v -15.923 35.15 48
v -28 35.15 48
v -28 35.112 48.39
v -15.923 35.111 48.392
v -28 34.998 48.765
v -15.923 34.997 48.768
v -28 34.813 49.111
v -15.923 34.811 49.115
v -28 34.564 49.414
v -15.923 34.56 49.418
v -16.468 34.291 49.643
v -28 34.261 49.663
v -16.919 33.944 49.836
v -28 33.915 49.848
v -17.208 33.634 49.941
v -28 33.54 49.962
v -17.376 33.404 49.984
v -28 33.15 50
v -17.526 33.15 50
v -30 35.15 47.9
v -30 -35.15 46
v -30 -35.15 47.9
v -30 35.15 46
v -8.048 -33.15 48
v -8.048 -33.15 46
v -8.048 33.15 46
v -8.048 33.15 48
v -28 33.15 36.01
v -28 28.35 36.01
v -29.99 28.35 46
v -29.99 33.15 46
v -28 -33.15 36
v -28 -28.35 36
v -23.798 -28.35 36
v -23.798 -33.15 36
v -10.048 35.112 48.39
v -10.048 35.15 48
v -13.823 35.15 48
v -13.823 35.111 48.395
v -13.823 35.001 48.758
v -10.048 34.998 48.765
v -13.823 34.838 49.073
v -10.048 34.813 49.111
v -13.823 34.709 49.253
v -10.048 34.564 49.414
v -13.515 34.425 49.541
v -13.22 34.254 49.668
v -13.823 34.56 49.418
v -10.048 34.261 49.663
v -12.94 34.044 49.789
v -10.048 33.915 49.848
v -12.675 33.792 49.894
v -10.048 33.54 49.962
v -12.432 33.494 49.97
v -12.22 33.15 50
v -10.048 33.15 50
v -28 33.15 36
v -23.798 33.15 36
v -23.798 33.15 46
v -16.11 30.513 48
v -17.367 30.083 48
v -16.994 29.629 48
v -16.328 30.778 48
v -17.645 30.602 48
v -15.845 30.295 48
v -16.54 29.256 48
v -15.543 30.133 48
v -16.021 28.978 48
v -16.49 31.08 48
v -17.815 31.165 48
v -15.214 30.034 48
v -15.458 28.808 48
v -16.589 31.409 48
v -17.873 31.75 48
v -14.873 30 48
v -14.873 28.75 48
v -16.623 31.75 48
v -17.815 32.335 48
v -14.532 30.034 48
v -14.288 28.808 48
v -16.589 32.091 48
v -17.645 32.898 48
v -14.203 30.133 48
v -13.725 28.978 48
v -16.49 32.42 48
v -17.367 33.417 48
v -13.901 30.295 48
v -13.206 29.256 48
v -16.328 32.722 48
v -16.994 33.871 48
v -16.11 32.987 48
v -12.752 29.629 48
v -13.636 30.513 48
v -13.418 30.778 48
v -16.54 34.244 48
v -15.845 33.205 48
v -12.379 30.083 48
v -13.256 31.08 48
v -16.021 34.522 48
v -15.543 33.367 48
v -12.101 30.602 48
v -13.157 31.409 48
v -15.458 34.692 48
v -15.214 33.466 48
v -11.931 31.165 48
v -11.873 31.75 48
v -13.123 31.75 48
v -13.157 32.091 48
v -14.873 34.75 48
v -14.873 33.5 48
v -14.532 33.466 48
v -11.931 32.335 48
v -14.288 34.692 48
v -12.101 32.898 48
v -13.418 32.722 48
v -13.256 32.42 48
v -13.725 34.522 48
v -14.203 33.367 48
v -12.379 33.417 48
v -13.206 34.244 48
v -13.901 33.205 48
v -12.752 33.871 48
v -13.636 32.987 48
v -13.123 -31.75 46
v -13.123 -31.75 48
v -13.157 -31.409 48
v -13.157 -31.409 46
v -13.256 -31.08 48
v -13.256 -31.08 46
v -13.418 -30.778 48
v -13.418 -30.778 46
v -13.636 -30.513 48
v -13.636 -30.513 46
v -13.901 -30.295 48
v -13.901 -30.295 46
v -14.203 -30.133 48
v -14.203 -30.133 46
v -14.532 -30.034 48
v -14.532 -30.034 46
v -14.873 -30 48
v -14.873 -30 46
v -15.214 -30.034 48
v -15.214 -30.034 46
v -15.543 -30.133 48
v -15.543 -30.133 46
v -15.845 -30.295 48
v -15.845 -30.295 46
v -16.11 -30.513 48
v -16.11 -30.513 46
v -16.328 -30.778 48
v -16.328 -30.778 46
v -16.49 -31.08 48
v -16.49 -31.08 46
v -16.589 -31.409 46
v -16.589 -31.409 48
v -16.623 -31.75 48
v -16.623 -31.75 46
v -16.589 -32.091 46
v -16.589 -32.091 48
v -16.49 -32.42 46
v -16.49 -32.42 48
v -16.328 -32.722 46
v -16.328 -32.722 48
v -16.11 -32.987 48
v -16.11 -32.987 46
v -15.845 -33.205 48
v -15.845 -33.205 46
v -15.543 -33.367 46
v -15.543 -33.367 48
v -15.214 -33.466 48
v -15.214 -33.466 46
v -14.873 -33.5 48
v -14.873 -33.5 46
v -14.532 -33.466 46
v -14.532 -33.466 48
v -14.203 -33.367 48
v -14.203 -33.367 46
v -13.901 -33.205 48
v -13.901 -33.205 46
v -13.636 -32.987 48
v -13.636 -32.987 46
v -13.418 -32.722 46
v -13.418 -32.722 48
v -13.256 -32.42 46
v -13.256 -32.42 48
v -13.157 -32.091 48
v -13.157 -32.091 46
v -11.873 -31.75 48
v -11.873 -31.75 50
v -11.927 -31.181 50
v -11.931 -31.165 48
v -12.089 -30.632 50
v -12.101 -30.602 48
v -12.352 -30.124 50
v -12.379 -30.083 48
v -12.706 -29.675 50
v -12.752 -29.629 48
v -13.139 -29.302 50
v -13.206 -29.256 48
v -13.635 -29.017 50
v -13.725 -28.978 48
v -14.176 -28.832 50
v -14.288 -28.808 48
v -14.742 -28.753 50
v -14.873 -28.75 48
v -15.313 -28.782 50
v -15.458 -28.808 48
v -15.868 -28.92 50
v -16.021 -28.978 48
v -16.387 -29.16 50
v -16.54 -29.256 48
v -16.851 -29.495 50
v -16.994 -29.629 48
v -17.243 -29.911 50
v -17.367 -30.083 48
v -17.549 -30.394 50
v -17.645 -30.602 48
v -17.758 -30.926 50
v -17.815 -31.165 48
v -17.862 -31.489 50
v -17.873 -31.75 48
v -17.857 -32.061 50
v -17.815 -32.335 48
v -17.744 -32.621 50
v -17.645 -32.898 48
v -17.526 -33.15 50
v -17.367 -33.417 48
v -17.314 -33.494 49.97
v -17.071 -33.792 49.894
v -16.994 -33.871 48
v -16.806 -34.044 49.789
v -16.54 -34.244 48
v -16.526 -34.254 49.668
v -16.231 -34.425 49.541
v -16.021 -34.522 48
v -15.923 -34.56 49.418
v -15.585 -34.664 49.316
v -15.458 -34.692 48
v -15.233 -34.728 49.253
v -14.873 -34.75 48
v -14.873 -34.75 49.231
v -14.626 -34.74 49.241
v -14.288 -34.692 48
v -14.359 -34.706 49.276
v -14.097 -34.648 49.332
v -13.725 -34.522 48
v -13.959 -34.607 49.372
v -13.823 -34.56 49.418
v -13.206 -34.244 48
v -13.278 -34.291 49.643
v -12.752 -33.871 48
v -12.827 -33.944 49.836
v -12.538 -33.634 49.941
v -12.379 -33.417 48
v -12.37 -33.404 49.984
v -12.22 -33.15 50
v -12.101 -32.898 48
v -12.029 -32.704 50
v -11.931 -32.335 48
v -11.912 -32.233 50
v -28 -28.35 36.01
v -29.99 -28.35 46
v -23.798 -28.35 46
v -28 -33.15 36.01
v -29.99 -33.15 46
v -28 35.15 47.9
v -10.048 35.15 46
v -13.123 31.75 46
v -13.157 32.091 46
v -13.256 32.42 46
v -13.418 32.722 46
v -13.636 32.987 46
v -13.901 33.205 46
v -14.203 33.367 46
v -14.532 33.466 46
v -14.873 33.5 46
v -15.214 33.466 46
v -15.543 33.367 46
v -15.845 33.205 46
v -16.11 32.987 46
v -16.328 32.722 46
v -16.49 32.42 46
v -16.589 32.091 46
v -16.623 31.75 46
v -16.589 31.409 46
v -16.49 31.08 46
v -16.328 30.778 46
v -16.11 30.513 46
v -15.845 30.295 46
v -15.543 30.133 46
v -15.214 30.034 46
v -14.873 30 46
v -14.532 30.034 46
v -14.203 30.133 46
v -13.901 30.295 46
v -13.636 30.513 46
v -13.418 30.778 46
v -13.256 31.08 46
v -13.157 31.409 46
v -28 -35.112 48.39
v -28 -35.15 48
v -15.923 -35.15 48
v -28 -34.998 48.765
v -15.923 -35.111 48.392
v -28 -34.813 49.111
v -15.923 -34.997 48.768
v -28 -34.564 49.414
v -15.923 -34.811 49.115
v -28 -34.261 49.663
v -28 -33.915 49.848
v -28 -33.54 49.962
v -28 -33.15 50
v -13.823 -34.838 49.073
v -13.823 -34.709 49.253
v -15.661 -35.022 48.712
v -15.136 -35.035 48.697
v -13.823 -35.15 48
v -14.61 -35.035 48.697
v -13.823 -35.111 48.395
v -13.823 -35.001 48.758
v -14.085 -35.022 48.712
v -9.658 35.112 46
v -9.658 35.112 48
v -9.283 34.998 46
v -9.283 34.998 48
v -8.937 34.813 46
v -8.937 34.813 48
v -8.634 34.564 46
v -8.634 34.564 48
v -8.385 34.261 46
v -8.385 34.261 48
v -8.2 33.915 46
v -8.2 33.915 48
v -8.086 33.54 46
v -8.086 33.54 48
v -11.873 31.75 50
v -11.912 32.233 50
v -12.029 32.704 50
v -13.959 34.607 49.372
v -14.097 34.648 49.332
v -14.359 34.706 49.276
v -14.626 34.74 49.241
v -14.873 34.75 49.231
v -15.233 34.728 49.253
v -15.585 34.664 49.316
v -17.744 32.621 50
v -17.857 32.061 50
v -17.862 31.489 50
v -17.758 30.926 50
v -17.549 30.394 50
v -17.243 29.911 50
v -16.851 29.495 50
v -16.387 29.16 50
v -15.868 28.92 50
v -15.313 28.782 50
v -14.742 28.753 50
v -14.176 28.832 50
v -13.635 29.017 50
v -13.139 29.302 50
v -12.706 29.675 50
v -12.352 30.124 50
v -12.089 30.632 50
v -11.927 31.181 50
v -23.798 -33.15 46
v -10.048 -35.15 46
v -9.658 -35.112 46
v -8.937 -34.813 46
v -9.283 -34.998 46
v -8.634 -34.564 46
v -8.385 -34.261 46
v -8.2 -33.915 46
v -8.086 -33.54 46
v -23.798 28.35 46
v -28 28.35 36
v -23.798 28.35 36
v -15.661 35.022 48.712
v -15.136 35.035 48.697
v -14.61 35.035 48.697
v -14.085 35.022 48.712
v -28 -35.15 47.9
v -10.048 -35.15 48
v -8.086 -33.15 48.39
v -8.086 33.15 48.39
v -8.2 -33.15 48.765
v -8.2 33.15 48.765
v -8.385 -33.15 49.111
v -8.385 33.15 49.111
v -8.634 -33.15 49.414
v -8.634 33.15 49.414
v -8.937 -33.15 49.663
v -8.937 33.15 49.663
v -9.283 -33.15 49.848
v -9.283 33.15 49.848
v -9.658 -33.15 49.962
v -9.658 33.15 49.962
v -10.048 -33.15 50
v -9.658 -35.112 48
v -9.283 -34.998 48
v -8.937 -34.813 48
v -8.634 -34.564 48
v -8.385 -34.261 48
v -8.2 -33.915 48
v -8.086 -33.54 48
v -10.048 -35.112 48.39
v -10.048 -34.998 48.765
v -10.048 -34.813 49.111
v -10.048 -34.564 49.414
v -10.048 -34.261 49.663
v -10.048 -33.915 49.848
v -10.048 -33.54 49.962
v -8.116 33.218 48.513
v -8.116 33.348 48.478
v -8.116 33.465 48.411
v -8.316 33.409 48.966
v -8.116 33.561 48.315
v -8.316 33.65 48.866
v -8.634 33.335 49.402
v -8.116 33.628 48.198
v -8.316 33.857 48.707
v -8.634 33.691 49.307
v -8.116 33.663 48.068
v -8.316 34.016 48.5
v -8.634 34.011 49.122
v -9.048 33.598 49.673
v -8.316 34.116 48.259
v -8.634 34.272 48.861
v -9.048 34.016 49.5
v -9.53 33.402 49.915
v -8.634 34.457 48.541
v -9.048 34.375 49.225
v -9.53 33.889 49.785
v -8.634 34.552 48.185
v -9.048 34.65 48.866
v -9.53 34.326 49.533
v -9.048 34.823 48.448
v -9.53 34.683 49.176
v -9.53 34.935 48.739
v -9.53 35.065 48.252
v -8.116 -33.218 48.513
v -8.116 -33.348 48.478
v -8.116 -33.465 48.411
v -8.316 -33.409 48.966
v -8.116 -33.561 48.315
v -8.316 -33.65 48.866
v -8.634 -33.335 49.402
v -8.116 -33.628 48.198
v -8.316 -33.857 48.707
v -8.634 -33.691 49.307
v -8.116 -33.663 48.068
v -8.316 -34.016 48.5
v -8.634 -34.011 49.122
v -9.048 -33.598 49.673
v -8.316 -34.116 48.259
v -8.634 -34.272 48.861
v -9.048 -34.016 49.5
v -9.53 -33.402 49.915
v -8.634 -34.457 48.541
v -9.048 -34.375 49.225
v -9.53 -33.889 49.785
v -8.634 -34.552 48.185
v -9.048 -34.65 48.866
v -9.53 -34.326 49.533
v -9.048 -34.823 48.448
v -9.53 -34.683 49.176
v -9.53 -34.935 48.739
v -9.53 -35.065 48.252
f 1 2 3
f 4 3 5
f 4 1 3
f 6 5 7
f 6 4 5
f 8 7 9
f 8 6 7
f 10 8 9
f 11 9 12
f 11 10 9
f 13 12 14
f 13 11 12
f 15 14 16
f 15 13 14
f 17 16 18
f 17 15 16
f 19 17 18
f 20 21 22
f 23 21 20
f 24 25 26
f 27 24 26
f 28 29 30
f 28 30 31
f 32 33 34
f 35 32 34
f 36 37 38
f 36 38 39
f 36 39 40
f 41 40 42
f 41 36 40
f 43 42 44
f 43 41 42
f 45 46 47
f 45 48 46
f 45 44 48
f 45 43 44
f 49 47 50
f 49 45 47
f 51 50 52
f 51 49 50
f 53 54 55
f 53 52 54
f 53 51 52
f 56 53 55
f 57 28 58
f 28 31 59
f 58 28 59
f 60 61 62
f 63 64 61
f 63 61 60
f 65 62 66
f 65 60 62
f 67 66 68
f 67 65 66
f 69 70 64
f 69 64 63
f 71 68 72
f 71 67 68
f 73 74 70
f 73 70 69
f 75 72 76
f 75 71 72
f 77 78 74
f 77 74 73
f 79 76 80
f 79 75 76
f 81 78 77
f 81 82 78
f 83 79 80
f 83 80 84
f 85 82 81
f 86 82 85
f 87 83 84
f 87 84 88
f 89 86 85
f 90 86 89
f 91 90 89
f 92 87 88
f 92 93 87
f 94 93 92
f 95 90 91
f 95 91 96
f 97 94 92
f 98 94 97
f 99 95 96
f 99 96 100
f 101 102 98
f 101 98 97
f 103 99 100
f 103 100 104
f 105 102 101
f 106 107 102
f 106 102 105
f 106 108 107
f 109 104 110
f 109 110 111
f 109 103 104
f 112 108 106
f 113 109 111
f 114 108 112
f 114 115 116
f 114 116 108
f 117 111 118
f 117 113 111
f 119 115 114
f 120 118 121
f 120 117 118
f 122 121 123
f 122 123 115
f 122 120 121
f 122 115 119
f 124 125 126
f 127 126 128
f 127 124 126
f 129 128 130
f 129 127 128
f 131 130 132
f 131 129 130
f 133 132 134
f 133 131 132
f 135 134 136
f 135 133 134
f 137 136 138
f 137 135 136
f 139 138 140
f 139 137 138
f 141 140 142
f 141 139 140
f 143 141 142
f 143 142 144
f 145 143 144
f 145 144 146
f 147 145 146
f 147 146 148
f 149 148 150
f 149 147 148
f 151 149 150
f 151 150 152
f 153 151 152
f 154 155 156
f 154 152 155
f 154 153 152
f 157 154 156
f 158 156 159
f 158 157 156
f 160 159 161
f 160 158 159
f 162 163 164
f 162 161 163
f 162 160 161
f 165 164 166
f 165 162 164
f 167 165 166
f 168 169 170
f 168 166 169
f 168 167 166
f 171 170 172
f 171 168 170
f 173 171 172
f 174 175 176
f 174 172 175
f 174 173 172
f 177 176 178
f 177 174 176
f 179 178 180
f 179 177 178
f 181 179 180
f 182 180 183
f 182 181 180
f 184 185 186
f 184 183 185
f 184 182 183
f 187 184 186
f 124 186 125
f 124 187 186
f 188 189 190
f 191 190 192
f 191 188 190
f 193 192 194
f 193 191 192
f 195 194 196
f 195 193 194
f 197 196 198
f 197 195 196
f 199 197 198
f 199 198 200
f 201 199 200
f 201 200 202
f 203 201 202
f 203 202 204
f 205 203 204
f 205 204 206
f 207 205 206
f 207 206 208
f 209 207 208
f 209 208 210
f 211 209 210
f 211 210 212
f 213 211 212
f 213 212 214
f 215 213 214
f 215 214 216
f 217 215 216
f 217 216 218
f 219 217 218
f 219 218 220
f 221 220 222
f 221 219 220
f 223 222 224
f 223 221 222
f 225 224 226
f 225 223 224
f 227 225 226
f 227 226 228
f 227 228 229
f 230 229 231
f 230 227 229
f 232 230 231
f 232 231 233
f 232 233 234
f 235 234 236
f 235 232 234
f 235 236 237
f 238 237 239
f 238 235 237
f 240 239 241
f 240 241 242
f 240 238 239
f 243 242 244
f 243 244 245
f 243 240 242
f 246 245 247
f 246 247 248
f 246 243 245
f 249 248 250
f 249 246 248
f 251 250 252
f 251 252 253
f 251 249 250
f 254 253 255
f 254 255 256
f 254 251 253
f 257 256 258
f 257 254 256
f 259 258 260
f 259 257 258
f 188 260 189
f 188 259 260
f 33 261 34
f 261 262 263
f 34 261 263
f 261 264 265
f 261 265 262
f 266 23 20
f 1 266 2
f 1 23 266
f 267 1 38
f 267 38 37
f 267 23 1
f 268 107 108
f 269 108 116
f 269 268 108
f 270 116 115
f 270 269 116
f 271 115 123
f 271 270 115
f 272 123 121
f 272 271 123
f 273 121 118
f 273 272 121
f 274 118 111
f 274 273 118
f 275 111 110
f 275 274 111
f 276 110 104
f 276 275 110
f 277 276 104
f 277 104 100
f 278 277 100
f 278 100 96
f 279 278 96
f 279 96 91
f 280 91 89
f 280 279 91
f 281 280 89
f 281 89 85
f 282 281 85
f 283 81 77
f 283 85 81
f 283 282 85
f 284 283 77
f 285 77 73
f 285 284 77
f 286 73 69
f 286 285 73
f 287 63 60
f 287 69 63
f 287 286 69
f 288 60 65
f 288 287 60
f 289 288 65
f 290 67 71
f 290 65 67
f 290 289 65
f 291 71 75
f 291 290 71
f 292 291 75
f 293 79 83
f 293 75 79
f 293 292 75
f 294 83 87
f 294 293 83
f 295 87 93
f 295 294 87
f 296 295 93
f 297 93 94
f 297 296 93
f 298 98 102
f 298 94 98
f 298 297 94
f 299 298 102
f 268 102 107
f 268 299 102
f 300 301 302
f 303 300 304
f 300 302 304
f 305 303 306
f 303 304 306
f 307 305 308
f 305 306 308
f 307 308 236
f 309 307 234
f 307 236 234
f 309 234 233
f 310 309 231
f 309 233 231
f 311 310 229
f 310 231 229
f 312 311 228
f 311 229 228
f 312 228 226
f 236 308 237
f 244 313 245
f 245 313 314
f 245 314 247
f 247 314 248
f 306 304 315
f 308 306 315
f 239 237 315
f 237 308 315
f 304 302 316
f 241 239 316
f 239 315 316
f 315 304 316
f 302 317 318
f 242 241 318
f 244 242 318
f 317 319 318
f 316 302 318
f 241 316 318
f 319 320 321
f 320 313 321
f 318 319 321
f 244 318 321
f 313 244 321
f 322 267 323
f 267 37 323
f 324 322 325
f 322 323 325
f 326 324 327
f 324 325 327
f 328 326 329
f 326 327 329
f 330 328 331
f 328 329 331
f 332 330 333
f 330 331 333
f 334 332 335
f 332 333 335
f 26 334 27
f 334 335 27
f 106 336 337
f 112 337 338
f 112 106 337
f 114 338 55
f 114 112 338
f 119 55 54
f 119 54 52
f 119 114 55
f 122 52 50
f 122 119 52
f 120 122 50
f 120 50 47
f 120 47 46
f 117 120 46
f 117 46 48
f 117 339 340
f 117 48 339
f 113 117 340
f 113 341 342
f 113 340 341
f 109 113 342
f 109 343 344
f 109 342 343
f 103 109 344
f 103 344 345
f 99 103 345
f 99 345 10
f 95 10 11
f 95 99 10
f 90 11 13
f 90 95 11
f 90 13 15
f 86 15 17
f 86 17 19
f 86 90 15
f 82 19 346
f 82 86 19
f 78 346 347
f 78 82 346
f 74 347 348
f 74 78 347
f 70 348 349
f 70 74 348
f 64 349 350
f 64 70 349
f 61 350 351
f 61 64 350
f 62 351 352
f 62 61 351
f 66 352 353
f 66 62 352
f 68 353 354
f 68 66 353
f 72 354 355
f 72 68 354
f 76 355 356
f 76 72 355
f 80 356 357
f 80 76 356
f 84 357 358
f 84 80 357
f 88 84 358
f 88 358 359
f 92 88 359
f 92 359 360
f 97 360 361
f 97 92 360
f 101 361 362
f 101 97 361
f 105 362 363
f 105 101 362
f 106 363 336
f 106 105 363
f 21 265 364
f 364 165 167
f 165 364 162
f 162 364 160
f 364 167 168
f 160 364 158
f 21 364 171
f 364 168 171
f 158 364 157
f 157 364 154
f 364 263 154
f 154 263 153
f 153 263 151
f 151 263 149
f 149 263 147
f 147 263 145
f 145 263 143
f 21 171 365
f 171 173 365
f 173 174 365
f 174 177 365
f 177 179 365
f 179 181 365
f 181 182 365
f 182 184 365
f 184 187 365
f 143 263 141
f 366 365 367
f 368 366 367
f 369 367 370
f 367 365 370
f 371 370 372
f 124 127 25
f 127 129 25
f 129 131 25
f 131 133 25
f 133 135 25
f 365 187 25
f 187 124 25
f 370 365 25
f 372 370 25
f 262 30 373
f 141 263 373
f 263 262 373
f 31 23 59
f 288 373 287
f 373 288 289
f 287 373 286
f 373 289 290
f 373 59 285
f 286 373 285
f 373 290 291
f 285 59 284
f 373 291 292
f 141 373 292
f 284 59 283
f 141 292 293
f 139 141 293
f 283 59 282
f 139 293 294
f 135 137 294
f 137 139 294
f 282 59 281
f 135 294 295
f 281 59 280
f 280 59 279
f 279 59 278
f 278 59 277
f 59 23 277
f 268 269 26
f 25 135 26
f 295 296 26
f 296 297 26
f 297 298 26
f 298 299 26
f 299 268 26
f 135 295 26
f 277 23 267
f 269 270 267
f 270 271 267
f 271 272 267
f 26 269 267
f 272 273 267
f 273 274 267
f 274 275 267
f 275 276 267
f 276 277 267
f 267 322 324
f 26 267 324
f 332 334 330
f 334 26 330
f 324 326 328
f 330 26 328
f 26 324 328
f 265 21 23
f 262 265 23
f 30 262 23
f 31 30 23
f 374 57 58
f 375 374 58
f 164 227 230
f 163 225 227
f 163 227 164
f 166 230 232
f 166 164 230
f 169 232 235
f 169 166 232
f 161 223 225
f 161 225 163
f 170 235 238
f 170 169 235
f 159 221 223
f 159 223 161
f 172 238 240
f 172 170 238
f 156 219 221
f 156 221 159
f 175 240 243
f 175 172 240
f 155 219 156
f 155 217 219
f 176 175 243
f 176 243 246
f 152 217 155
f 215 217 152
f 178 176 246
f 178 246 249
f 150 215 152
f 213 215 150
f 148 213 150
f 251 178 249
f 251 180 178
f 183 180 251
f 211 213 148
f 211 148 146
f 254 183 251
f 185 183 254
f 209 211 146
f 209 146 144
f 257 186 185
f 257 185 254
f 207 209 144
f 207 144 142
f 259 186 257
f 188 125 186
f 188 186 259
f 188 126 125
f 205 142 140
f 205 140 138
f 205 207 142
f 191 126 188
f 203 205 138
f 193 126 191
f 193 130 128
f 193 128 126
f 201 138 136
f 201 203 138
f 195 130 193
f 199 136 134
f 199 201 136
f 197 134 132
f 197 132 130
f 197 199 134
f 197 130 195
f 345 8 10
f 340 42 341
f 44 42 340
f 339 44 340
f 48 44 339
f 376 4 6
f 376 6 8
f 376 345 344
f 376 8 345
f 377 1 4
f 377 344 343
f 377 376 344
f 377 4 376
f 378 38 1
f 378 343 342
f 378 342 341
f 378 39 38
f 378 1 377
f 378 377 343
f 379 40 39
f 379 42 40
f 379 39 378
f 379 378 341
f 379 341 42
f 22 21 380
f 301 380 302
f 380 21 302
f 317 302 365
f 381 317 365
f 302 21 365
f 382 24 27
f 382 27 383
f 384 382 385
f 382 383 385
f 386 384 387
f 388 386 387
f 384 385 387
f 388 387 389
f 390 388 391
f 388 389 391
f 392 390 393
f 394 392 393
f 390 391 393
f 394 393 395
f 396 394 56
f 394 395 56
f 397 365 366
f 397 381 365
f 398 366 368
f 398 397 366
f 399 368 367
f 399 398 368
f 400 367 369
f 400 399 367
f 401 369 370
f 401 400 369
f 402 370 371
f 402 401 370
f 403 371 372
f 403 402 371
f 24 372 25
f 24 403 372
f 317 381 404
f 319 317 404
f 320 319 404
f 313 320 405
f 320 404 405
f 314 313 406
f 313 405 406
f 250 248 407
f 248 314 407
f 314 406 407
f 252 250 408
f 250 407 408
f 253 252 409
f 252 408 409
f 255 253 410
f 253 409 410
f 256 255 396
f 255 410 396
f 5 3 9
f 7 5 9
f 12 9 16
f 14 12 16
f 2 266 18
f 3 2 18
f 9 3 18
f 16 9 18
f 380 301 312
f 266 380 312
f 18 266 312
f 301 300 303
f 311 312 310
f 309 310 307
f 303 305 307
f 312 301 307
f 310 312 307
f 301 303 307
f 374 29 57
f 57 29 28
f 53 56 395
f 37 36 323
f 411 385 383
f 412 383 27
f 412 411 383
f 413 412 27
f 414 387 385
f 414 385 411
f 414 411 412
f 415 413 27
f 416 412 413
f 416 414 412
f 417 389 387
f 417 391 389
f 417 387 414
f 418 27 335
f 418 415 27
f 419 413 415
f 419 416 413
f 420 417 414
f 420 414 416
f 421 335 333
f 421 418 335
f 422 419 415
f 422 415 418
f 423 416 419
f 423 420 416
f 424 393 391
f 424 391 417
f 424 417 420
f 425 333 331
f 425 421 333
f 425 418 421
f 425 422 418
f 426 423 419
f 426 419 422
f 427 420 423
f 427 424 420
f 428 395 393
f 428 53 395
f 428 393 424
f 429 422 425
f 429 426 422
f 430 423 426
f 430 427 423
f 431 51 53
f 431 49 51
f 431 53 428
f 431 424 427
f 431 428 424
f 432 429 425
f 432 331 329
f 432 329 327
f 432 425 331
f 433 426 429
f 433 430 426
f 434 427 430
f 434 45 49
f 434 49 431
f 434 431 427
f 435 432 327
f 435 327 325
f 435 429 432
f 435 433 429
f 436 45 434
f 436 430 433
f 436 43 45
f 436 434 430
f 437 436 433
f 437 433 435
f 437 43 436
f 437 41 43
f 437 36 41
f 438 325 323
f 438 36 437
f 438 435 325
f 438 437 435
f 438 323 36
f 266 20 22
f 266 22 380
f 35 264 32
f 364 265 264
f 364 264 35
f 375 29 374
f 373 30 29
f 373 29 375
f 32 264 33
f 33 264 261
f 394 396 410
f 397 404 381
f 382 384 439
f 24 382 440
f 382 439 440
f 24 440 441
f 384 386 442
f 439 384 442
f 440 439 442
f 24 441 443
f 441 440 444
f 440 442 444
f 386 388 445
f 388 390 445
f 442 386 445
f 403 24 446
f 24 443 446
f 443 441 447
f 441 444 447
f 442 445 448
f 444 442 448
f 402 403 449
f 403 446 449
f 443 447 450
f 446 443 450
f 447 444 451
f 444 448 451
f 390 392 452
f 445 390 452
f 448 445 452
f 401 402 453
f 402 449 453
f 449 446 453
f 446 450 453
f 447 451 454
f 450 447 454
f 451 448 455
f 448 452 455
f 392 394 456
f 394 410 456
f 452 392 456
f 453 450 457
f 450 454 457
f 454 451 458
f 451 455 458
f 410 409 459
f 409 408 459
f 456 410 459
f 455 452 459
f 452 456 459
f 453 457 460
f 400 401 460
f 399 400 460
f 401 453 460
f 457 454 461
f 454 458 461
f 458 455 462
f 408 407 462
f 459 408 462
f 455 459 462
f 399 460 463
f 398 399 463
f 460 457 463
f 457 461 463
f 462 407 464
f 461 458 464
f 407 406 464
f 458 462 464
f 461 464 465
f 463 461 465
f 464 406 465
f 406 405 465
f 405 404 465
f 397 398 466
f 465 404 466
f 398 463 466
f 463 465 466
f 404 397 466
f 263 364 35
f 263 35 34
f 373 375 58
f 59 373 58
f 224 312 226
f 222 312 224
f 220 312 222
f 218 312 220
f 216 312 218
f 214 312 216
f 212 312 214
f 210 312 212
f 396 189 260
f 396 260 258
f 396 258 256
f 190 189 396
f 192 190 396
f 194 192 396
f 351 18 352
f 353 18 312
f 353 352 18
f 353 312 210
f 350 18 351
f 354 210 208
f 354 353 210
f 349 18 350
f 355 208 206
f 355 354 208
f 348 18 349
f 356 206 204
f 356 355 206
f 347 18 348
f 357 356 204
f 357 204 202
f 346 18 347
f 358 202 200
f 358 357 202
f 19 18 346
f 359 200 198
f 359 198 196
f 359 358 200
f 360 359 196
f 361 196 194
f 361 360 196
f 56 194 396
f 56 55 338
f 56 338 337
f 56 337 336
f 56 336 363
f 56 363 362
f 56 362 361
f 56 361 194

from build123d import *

# Parameters (mm, degrees)
SKETCH125_W          = 21.952
SKETCH125_H          = 70.3
SKETCH125_R          = 1.75
PAD042_DEPTH         = 4
FILLET010_R          = 2
SKETCH126_W          = 2
SKETCH126_H          = 2.1
POCKET054_DEPTH      = 35.151
POCKET054_DEPTH_BACK = 35.151
SKETCH127_R          = 3
POCKET053_DEPTH      = 2.001
SKETCH128_W          = 4.202
SKETCH128_H          = 4.8
PAD043_DEPTH         = 10
CHAMFER006_SIZE2     = 9.99
CHAMFER006_SIZE      = 1.99


with BuildPart() as part:
    # Sketch125 → Pad042 (new body)
    with BuildSketch(Plane.XY):
        with Locations((-19.024, 0)):
            Rectangle(SKETCH125_W, SKETCH125_H)
        with Locations((-14.873, 31.75)):
            Circle(SKETCH125_R, mode=Mode.SUBTRACT)
        with Locations((-14.873, -31.75)):
            Circle(SKETCH125_R, mode=Mode.SUBTRACT)
    extrude(amount=PAD042_DEPTH)

    # Fillet010
    fillet010_edges = [part.edges().sort_by_distance(p)[0] for p in [
        (-19.024, 35.15, 4),
        (-19.024, -35.15, 4),
        (-8.048, 0, 4),
        (-8.048, -35.15, 2),
        (-8.048, 35.15, 2),
    ]]
    fillet(fillet010_edges, radius=FILLET010_R)

    # Sketch126 → Pocket054 (cut, two sides)
    with BuildSketch(Plane.XZ) as pocket054_sk:
        with Locations((-29, 2.95)):
            Rectangle(SKETCH126_W, SKETCH126_H)
    extrude(amount=-POCKET054_DEPTH, mode=Mode.SUBTRACT)
    extrude(pocket054_sk.sketch, amount=POCKET054_DEPTH_BACK, mode=Mode.SUBTRACT)

    # Sketch127 → Pocket053 (cut, through all)
    with BuildSketch(Plane.XY.offset(2)):
        with Locations((-14.873, -31.75)):
            Circle(SKETCH127_R)
        with Locations((-14.873, 31.75)):
            Circle(SKETCH127_R)
    extrude(amount=POCKET053_DEPTH, mode=Mode.SUBTRACT)

    # Sketch128 → Pad043 (join)
    with BuildSketch(Plane.XY):
        with Locations((-25.899, 30.75)):
            Rectangle(SKETCH128_W, SKETCH128_H)
        with Locations((-25.899, -30.75)):
            Rectangle(SKETCH128_W, SKETCH128_H)
    extrude(amount=-PAD043_DEPTH)

    # Chamfer006
    chamfer006_edges = [part.edges().sort_by_distance(p)[0] for p in [
        (-28, 30.75, 0),
        (-28, -30.75, 0),
    ]]
    chamfer006_side = part.faces().sort_by_distance((-18.902955, 0, 0))[0]
    chamfer(chamfer006_edges, length=CHAMFER006_SIZE, length2=CHAMFER006_SIZE2, reference=chamfer006_side)


with BuildPart() as part_1:
    # Body062 placement: moved
    add(part.part.moved(Location((0, 0, 46))))


solid = part_1.part
